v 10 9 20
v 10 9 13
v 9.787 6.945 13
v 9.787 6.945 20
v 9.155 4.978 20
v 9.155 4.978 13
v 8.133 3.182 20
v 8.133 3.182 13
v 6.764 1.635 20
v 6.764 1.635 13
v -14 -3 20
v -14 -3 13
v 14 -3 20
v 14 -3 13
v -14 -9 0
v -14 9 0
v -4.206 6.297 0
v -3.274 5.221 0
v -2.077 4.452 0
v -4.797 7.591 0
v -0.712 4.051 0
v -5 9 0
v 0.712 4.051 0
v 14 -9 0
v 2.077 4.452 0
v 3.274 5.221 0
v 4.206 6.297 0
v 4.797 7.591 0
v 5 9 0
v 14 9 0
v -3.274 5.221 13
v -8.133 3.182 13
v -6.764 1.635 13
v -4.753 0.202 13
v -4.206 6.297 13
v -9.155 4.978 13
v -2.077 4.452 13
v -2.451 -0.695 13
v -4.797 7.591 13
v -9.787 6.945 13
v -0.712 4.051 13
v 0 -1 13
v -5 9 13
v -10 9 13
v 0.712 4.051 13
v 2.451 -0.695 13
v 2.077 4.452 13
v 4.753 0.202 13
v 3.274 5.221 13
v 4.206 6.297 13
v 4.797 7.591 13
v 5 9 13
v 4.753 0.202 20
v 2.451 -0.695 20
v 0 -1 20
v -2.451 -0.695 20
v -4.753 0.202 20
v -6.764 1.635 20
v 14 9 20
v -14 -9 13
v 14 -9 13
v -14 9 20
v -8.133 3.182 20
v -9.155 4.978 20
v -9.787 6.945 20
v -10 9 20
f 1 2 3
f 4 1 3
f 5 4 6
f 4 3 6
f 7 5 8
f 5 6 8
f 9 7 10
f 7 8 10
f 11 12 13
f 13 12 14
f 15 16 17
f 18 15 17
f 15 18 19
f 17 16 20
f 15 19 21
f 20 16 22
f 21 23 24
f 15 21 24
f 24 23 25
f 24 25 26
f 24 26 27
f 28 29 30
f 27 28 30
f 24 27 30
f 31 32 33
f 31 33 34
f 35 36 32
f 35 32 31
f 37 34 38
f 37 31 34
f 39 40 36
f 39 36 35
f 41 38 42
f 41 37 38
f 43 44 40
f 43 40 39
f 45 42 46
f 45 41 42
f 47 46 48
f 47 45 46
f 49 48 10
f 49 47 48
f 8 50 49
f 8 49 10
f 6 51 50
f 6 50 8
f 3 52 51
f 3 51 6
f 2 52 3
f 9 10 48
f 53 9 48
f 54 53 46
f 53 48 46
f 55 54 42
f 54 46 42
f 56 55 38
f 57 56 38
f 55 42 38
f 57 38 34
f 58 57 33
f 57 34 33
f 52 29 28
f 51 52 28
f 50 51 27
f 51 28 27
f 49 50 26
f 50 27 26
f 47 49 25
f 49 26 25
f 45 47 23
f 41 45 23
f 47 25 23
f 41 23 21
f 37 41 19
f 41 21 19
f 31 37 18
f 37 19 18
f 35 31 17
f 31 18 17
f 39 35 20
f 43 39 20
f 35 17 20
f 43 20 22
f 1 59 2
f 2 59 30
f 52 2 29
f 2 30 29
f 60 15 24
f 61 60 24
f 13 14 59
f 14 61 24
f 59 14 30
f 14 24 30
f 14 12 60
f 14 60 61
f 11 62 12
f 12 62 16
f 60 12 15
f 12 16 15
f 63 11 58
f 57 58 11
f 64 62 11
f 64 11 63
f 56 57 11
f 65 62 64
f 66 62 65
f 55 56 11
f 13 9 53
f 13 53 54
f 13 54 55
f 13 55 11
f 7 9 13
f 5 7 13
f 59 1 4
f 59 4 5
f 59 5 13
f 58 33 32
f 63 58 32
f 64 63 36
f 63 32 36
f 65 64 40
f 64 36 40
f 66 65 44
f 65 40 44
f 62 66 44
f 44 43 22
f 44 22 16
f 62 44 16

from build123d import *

# Parameters (mm, degrees)
EXTRUDE_3_DEPTH = 13
SKETCH_5_4_W    = 28
SKETCH_5_4_H    = 10.634799235
EXTRUDE_4_DEPTH = 13
EXTRUDE_5_DEPTH = 7


with BuildPart() as part:
    # 草图5 → 凸台-拉伸3 (new body)
    with BuildSketch(Plane.XY):
        with BuildLine():
            Line((14, 9), (5, 9))
            ThreePointArc((5, 9), (0, 4), (-5, 9))
            Line((-5, 9), (-14, 9))
            Line((-14, 9), (-14, 1.634799235))
            Line((-14, 1.634799235), (14, 1.634799235))
            Line((14, 1.634799235), (14, 9))
        make_face()
    extrude(amount=EXTRUDE_3_DEPTH)



with BuildPart() as body_2:
    # 草图5<4> → 凸台-拉伸4 (new body)
    with BuildSketch(Plane.XY):
        with Locations((0, -3.682600382)):
            Rectangle(SKETCH_5_4_W, SKETCH_5_4_H)
    extrude(amount=EXTRUDE_4_DEPTH)


with BuildPart() as part_1:
    add(part.part)

    add(body_2.part)  # 凸台-拉伸5 merges body 2
    # 草图6 → 凸台-拉伸5 (add)
    with BuildSketch(Plane.XY.offset(13)):
        with BuildLine():
            Line((-10, 9), (-14, 9))
            Line((-14, 9), (-14, -3))
            Line((-14, -3), (14, -3))
            Line((14, -3), (14, 9))
            Line((14, 9), (10, 9))
            ThreePointArc((10, 9), (0, -1), (-10, 9))
        make_face()
    extrude(amount=EXTRUDE_5_DEPTH)


solid = part_1.part
